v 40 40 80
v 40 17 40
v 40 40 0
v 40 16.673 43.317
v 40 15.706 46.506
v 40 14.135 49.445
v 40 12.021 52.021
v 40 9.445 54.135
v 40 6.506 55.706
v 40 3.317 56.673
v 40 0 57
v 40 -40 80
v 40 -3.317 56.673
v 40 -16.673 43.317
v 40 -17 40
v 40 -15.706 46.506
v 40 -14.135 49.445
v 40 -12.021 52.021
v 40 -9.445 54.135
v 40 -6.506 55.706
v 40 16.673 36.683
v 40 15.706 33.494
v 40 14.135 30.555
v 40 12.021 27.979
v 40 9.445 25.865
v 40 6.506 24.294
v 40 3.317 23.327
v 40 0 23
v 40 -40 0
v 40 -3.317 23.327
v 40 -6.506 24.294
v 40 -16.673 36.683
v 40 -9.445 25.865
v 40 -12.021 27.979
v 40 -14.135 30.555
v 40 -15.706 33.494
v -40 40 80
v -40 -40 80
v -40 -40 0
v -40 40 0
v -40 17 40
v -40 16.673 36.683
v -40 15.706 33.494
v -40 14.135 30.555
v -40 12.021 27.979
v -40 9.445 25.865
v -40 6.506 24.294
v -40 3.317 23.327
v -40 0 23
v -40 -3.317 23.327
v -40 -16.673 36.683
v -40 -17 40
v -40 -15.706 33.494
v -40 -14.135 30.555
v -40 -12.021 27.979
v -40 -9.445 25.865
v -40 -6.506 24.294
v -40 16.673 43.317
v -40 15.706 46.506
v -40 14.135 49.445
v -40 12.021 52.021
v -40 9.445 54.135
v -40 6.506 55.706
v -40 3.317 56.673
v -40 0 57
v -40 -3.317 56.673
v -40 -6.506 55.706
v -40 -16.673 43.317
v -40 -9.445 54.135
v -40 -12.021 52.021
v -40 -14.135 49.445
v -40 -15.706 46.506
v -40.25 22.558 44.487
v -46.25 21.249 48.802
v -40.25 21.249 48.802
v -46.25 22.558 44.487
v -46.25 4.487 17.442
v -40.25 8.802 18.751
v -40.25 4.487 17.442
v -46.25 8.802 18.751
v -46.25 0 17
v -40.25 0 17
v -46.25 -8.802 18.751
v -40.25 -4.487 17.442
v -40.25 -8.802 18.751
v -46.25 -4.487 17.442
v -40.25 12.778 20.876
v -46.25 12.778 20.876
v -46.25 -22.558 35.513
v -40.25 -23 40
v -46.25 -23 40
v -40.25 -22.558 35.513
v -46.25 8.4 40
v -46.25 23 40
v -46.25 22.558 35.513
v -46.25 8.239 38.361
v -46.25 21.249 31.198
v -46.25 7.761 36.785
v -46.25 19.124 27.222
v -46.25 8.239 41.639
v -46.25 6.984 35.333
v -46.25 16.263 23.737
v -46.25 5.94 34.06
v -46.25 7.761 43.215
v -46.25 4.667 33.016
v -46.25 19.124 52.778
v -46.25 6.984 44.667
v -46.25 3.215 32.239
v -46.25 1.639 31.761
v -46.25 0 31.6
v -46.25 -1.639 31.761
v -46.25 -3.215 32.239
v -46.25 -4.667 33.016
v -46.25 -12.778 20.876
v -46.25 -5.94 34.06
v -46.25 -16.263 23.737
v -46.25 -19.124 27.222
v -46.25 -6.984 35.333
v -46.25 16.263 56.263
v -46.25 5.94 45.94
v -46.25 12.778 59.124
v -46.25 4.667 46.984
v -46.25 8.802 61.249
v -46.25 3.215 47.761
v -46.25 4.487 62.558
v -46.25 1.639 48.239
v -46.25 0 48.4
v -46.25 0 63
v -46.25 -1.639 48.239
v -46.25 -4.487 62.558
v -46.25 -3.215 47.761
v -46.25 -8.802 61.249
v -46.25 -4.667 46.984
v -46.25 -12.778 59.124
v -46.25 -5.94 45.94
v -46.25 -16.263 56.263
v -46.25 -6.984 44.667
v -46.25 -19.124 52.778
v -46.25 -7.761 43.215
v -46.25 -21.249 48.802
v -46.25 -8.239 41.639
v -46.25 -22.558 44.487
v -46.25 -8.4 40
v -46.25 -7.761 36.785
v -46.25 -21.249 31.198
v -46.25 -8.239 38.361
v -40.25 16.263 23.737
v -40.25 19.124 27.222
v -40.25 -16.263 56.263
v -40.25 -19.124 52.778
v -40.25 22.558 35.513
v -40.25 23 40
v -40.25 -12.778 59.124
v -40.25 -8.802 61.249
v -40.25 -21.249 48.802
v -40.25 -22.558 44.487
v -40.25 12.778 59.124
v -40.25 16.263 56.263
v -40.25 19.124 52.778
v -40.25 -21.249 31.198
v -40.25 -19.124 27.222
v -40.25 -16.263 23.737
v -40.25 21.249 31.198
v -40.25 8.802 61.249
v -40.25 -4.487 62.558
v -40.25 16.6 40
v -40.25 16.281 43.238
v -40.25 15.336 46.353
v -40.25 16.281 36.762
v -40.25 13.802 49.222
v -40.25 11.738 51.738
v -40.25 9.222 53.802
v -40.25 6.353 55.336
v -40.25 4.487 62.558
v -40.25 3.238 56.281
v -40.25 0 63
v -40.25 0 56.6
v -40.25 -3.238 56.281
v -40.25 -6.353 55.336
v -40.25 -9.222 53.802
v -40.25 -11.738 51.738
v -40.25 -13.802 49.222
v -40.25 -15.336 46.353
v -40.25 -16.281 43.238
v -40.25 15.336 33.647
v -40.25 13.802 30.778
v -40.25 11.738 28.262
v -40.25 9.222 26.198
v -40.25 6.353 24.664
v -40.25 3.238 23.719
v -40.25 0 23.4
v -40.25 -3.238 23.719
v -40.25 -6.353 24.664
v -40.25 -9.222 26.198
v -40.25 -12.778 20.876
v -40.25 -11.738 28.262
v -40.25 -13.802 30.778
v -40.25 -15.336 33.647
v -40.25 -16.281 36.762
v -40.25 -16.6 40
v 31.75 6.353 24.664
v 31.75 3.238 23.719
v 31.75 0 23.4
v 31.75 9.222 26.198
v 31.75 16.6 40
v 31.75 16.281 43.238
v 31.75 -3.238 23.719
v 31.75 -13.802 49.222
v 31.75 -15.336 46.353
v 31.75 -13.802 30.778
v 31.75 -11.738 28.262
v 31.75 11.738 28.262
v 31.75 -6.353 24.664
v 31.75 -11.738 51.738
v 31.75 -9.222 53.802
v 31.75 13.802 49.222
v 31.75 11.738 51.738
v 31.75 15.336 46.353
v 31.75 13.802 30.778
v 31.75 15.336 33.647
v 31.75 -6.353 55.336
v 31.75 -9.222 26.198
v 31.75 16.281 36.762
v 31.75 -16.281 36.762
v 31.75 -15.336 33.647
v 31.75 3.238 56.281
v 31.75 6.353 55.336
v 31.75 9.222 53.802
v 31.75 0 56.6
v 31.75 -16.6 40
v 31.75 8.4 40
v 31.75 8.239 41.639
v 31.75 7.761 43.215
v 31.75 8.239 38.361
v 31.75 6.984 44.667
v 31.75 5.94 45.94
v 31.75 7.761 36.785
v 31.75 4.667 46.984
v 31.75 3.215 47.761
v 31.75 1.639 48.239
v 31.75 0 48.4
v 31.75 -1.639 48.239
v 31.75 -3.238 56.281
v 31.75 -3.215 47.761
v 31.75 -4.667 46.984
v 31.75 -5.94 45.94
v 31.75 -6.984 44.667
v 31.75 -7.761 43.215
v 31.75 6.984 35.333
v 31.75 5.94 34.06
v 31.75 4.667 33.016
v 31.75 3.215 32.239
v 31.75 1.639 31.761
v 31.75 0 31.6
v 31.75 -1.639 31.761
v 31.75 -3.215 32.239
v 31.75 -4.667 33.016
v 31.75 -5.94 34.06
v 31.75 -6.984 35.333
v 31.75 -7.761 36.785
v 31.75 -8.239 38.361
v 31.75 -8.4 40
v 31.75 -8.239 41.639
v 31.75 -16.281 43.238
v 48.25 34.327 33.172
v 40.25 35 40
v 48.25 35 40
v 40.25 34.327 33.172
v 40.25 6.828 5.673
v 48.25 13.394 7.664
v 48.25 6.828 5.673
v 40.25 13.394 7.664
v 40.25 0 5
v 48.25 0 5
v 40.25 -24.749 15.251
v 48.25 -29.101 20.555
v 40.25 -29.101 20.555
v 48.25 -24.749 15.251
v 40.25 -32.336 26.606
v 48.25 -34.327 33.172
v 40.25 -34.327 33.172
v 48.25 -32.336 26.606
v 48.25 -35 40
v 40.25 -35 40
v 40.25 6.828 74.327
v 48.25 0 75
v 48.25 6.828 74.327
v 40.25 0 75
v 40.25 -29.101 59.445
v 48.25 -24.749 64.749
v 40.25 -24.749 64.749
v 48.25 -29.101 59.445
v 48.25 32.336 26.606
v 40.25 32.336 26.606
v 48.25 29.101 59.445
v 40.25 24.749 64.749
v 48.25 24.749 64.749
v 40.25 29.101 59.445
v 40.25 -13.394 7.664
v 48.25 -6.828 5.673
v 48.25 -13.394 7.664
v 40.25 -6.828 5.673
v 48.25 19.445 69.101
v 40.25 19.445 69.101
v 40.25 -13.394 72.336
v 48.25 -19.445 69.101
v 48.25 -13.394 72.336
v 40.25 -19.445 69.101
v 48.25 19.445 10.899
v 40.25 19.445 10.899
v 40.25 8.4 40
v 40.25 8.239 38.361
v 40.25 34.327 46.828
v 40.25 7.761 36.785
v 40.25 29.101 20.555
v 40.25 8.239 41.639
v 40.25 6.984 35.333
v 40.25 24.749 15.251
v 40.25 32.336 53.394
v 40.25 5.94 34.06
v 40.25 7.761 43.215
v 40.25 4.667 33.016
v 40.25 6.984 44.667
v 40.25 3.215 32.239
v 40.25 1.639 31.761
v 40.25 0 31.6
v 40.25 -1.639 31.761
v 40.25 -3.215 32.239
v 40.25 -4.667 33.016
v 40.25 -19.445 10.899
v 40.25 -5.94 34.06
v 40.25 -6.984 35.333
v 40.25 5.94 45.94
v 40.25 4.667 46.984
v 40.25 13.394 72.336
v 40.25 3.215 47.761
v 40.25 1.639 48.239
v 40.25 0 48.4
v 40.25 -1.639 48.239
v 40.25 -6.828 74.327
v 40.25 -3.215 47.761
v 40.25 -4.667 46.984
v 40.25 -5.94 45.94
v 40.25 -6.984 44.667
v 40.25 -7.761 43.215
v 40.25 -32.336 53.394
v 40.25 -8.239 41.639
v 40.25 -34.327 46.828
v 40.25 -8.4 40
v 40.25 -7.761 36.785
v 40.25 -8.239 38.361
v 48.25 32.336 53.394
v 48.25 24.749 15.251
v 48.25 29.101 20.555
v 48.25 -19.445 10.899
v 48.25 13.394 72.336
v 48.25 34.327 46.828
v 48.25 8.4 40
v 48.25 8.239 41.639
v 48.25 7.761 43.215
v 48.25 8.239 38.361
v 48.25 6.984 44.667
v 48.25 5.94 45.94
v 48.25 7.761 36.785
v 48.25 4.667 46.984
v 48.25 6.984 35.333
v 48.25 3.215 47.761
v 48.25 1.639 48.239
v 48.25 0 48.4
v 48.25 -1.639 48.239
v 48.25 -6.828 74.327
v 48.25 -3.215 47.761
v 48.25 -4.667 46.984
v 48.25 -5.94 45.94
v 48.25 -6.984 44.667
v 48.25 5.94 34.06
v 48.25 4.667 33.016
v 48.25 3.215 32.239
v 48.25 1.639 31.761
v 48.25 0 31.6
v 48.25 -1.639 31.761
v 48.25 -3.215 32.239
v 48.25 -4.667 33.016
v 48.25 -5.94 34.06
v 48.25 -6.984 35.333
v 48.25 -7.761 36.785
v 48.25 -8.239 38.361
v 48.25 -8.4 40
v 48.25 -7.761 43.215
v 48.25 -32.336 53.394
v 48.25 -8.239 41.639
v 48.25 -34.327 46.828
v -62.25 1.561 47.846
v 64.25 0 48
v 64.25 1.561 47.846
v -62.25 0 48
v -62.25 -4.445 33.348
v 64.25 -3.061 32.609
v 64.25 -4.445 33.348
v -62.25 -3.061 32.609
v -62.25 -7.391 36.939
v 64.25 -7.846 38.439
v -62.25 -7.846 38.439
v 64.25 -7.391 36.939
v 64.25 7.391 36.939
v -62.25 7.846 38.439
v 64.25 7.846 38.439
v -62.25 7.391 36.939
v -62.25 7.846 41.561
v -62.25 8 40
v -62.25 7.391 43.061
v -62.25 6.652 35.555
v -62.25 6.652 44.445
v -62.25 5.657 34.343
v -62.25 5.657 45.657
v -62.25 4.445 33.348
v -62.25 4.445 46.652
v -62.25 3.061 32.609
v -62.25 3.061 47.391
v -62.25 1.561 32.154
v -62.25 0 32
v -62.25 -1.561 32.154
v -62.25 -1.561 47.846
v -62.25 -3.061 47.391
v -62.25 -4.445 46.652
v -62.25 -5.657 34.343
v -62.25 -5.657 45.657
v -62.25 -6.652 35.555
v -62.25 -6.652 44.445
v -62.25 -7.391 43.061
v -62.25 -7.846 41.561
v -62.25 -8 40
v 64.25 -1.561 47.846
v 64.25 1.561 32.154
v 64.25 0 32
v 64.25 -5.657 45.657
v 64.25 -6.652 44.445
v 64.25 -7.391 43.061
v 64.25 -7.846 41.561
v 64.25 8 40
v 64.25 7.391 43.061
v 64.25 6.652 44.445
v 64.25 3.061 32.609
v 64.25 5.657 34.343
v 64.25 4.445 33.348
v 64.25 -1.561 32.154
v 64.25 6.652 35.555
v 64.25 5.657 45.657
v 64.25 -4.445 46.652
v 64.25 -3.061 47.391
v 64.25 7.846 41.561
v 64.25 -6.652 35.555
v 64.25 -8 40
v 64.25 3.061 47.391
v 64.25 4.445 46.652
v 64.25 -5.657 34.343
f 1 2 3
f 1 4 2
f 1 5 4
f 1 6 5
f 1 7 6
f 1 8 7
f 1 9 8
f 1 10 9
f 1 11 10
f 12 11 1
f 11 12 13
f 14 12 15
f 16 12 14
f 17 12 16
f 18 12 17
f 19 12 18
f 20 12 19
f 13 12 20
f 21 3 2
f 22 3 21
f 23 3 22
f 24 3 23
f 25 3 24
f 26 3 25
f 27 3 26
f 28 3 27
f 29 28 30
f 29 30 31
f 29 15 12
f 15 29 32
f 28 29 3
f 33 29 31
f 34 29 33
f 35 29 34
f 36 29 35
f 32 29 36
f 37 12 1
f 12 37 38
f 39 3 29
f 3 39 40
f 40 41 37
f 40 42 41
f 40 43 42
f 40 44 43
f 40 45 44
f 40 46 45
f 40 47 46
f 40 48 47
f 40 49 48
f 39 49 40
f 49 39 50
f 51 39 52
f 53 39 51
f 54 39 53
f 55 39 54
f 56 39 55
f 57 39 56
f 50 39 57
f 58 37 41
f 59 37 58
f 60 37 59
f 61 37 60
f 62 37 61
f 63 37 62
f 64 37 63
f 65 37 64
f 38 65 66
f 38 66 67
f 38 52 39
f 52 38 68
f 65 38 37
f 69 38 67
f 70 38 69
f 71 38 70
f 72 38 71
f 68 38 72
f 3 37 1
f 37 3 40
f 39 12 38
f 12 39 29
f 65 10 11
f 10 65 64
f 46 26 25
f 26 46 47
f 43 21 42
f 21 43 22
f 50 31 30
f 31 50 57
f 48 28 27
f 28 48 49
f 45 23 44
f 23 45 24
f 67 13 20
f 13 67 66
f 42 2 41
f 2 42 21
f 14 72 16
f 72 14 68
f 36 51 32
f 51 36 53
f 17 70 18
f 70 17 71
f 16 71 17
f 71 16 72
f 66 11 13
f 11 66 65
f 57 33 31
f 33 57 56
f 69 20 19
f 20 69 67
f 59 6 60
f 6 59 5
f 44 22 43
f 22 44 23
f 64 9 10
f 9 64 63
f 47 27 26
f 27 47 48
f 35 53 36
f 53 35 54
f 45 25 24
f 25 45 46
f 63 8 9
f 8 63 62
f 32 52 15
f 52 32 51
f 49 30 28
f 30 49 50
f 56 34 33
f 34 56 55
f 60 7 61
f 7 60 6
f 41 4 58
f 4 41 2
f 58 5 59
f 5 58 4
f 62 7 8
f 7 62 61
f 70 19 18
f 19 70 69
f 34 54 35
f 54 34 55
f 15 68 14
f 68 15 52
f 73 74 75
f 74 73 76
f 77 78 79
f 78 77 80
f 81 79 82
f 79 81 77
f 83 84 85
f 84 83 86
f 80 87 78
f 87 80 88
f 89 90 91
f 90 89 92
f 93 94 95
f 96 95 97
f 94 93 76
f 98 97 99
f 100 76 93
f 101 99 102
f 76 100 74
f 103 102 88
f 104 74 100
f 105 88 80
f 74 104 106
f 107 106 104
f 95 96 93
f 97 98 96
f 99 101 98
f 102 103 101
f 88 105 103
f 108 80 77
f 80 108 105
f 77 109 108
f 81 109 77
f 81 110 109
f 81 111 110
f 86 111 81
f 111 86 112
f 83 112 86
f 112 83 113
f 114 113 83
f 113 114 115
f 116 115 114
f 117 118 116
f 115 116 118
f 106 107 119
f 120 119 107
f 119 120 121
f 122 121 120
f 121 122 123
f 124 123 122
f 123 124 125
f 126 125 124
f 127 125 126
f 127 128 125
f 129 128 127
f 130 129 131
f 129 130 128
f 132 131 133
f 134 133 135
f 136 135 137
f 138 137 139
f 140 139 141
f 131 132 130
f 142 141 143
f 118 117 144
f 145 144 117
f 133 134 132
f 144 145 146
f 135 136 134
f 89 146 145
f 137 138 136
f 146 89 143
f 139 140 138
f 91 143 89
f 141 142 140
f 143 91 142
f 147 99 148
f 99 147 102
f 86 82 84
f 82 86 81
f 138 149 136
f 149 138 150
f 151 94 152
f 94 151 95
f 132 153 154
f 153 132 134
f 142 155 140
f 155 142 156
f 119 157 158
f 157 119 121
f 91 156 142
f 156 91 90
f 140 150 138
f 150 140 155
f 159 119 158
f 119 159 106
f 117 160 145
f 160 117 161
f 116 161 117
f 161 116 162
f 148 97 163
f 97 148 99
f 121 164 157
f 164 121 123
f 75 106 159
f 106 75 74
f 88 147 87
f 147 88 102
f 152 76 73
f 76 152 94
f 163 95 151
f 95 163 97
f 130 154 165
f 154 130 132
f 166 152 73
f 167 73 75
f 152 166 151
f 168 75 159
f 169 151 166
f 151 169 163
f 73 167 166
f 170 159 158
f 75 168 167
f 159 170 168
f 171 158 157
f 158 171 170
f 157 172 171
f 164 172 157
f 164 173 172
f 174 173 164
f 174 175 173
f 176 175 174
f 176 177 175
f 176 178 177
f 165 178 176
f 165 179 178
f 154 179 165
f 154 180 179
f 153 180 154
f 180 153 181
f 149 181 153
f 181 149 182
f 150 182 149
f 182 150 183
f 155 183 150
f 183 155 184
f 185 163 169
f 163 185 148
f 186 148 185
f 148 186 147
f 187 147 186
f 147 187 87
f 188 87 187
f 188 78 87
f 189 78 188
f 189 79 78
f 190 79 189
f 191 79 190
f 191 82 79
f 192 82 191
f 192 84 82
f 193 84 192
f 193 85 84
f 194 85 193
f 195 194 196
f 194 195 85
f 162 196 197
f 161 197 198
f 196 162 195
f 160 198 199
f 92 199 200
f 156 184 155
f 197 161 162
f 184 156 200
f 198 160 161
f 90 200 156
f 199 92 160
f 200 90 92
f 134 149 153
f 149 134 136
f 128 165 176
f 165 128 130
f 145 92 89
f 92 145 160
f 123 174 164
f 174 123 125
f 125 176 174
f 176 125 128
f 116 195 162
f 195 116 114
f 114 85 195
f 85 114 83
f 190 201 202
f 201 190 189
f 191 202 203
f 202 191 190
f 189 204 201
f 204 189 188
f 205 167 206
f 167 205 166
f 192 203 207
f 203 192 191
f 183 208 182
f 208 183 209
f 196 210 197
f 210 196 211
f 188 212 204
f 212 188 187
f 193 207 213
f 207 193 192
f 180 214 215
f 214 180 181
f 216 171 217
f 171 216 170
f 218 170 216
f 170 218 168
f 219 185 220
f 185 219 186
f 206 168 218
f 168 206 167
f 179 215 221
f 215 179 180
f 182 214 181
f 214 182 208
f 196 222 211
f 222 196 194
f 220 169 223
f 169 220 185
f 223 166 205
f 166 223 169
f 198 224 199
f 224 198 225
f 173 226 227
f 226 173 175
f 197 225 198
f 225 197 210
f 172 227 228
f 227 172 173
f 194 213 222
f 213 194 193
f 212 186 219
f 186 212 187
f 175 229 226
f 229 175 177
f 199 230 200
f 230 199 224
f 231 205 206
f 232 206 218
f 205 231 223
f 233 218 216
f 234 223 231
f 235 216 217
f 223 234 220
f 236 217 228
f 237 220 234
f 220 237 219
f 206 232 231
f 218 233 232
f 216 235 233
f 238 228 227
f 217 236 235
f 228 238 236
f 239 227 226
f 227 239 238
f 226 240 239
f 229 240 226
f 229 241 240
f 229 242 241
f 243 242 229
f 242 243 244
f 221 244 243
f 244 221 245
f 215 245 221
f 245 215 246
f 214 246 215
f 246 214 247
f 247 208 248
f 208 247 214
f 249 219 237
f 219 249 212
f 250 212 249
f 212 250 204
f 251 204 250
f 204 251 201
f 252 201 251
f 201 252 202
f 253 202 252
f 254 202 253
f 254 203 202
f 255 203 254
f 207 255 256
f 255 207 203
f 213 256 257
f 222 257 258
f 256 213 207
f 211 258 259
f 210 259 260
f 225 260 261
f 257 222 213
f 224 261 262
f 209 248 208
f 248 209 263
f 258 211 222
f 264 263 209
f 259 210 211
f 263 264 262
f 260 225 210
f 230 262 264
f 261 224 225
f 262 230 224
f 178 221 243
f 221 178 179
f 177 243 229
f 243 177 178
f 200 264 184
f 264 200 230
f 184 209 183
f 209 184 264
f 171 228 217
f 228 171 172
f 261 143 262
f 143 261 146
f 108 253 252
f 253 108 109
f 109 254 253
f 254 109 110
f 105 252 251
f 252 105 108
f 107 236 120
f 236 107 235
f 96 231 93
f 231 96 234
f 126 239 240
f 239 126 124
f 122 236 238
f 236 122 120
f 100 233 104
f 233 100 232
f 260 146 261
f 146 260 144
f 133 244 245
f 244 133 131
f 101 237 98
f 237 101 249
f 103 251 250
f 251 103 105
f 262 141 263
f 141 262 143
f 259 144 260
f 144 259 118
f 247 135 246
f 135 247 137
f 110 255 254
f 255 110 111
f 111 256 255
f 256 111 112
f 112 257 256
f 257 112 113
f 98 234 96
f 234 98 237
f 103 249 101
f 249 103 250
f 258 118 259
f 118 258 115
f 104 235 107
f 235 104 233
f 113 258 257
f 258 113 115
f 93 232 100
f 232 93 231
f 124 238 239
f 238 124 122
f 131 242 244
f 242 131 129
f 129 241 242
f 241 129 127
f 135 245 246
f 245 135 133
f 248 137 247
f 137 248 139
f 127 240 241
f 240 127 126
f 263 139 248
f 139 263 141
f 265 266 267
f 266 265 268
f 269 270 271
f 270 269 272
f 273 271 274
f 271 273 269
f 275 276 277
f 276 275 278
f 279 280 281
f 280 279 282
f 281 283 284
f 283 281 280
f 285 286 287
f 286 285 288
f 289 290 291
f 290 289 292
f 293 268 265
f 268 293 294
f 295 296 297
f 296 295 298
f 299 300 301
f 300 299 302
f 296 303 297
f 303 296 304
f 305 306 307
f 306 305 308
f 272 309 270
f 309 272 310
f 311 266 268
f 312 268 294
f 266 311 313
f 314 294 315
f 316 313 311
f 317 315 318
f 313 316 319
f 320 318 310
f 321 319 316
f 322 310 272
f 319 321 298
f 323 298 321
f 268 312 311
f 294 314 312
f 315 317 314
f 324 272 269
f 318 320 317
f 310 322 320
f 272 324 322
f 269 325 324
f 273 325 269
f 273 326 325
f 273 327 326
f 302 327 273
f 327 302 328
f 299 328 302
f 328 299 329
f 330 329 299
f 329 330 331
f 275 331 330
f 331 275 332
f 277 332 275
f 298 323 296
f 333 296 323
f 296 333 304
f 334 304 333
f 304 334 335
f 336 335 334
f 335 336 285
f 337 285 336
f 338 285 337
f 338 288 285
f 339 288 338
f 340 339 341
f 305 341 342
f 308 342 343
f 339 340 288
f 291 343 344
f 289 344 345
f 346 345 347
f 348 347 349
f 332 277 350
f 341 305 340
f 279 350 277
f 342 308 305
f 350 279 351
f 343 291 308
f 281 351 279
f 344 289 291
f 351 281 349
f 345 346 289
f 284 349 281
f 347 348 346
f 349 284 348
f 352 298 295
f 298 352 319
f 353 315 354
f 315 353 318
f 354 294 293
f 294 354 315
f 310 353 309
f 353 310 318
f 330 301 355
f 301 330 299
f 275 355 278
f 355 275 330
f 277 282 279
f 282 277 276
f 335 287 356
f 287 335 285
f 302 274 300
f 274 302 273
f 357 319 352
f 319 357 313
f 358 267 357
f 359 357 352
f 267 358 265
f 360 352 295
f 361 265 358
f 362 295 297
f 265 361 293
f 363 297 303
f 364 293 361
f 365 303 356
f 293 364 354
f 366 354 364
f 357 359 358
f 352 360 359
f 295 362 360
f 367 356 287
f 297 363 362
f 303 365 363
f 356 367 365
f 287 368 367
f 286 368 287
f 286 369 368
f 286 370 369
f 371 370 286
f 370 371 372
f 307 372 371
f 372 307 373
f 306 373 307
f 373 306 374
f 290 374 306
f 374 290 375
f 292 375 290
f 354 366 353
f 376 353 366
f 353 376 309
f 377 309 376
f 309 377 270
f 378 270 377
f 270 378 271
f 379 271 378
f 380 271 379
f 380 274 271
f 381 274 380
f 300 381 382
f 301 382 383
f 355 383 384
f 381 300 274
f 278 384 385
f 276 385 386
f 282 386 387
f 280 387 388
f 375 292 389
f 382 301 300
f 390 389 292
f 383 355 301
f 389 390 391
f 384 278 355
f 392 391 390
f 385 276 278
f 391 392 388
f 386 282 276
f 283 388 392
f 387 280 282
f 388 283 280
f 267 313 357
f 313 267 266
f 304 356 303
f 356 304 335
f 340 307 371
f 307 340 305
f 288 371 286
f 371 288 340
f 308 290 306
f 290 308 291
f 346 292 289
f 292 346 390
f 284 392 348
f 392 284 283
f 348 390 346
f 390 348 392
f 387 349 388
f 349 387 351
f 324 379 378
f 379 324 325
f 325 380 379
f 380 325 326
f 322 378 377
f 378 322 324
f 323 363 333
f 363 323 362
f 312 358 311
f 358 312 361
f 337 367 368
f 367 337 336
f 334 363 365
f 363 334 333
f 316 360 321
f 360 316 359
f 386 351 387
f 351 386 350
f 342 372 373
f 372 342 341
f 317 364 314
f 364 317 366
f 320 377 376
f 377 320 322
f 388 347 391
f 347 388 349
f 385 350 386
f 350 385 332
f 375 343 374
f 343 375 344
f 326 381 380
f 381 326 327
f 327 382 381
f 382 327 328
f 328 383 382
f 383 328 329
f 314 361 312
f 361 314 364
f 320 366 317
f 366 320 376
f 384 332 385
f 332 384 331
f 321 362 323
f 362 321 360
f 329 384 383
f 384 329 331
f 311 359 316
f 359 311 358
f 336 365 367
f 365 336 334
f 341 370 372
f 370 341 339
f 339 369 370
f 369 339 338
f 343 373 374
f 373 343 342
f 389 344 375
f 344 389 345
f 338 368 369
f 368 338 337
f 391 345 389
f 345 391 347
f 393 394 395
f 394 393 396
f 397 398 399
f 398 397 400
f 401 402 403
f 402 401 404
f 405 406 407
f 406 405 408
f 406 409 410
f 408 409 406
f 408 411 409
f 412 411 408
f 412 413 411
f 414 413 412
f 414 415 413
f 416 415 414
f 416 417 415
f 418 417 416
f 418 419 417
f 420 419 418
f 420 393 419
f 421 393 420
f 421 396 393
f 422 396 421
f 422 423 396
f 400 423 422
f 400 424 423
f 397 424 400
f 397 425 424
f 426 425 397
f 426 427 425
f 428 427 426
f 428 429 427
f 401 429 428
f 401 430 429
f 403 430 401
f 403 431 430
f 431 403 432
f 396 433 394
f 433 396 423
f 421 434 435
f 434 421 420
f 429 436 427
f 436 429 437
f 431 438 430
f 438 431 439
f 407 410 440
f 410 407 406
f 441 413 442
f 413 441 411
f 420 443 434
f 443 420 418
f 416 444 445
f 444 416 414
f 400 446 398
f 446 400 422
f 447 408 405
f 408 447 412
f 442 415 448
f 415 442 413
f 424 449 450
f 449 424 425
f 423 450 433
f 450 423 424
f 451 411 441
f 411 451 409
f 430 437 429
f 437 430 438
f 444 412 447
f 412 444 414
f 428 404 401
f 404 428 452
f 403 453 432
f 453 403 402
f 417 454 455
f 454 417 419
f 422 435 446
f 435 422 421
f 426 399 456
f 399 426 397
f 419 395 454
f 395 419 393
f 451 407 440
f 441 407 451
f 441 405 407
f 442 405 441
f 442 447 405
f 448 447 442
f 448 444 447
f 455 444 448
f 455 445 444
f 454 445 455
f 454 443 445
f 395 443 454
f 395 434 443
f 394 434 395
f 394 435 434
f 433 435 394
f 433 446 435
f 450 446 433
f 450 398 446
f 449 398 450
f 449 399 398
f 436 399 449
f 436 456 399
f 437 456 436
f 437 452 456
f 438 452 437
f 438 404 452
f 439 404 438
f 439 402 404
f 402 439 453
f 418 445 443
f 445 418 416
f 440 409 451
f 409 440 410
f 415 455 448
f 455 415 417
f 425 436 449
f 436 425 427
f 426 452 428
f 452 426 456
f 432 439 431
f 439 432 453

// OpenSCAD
$fn = 32;

// ------------------------------------------------------------------------
// Bushed housing: 80 x 80 x 80 mm housing, bushing d33.2
// Every part is its own module, assembly() places them once.
// ------------------------------------------------------------------------

// --- part 1 ---
module housing() {
  difference() {
    translate([-40, -40, 0]) cube([80, 80, 80]);
    translate([0, 0, 40]) rotate([0, 90, 0]) cylinder(h = 82, d = 34, center = true);
  }
}

// --- part 2 ---
module bushing() {
  difference() {
    union() {
      cylinder(h = 6, d = 46);
      translate([0, 0, 6]) cylinder(h = 72, d = 33.2);
    }
    translate([0, 0, -1]) cylinder(h = 80, d = 16.8);
  }
}

// --- part 3 ---
module shaft() {
  translate([0, 0, -63.25]) cylinder(h = 126.5, d = 16);
}

// --- part 4 ---
module cover() {
  difference() {
    cylinder(h = 8, d = 70);
    translate([0, 0, -1]) cylinder(h = 10, d = 16.8);
  }
}

// --- assembly ---
module assembly() {
  translate([0, 0, 0]) rotate([0, 0, 0]) housing();
  translate([-46.25, 0, 40]) rotate([0, 90, 0]) bushing();
  translate([1, 0, 40]) rotate([0, 90, 0]) shaft();
  translate([40.25, 0, 40]) rotate([0, 90, 0]) cover();
}

assembly();
